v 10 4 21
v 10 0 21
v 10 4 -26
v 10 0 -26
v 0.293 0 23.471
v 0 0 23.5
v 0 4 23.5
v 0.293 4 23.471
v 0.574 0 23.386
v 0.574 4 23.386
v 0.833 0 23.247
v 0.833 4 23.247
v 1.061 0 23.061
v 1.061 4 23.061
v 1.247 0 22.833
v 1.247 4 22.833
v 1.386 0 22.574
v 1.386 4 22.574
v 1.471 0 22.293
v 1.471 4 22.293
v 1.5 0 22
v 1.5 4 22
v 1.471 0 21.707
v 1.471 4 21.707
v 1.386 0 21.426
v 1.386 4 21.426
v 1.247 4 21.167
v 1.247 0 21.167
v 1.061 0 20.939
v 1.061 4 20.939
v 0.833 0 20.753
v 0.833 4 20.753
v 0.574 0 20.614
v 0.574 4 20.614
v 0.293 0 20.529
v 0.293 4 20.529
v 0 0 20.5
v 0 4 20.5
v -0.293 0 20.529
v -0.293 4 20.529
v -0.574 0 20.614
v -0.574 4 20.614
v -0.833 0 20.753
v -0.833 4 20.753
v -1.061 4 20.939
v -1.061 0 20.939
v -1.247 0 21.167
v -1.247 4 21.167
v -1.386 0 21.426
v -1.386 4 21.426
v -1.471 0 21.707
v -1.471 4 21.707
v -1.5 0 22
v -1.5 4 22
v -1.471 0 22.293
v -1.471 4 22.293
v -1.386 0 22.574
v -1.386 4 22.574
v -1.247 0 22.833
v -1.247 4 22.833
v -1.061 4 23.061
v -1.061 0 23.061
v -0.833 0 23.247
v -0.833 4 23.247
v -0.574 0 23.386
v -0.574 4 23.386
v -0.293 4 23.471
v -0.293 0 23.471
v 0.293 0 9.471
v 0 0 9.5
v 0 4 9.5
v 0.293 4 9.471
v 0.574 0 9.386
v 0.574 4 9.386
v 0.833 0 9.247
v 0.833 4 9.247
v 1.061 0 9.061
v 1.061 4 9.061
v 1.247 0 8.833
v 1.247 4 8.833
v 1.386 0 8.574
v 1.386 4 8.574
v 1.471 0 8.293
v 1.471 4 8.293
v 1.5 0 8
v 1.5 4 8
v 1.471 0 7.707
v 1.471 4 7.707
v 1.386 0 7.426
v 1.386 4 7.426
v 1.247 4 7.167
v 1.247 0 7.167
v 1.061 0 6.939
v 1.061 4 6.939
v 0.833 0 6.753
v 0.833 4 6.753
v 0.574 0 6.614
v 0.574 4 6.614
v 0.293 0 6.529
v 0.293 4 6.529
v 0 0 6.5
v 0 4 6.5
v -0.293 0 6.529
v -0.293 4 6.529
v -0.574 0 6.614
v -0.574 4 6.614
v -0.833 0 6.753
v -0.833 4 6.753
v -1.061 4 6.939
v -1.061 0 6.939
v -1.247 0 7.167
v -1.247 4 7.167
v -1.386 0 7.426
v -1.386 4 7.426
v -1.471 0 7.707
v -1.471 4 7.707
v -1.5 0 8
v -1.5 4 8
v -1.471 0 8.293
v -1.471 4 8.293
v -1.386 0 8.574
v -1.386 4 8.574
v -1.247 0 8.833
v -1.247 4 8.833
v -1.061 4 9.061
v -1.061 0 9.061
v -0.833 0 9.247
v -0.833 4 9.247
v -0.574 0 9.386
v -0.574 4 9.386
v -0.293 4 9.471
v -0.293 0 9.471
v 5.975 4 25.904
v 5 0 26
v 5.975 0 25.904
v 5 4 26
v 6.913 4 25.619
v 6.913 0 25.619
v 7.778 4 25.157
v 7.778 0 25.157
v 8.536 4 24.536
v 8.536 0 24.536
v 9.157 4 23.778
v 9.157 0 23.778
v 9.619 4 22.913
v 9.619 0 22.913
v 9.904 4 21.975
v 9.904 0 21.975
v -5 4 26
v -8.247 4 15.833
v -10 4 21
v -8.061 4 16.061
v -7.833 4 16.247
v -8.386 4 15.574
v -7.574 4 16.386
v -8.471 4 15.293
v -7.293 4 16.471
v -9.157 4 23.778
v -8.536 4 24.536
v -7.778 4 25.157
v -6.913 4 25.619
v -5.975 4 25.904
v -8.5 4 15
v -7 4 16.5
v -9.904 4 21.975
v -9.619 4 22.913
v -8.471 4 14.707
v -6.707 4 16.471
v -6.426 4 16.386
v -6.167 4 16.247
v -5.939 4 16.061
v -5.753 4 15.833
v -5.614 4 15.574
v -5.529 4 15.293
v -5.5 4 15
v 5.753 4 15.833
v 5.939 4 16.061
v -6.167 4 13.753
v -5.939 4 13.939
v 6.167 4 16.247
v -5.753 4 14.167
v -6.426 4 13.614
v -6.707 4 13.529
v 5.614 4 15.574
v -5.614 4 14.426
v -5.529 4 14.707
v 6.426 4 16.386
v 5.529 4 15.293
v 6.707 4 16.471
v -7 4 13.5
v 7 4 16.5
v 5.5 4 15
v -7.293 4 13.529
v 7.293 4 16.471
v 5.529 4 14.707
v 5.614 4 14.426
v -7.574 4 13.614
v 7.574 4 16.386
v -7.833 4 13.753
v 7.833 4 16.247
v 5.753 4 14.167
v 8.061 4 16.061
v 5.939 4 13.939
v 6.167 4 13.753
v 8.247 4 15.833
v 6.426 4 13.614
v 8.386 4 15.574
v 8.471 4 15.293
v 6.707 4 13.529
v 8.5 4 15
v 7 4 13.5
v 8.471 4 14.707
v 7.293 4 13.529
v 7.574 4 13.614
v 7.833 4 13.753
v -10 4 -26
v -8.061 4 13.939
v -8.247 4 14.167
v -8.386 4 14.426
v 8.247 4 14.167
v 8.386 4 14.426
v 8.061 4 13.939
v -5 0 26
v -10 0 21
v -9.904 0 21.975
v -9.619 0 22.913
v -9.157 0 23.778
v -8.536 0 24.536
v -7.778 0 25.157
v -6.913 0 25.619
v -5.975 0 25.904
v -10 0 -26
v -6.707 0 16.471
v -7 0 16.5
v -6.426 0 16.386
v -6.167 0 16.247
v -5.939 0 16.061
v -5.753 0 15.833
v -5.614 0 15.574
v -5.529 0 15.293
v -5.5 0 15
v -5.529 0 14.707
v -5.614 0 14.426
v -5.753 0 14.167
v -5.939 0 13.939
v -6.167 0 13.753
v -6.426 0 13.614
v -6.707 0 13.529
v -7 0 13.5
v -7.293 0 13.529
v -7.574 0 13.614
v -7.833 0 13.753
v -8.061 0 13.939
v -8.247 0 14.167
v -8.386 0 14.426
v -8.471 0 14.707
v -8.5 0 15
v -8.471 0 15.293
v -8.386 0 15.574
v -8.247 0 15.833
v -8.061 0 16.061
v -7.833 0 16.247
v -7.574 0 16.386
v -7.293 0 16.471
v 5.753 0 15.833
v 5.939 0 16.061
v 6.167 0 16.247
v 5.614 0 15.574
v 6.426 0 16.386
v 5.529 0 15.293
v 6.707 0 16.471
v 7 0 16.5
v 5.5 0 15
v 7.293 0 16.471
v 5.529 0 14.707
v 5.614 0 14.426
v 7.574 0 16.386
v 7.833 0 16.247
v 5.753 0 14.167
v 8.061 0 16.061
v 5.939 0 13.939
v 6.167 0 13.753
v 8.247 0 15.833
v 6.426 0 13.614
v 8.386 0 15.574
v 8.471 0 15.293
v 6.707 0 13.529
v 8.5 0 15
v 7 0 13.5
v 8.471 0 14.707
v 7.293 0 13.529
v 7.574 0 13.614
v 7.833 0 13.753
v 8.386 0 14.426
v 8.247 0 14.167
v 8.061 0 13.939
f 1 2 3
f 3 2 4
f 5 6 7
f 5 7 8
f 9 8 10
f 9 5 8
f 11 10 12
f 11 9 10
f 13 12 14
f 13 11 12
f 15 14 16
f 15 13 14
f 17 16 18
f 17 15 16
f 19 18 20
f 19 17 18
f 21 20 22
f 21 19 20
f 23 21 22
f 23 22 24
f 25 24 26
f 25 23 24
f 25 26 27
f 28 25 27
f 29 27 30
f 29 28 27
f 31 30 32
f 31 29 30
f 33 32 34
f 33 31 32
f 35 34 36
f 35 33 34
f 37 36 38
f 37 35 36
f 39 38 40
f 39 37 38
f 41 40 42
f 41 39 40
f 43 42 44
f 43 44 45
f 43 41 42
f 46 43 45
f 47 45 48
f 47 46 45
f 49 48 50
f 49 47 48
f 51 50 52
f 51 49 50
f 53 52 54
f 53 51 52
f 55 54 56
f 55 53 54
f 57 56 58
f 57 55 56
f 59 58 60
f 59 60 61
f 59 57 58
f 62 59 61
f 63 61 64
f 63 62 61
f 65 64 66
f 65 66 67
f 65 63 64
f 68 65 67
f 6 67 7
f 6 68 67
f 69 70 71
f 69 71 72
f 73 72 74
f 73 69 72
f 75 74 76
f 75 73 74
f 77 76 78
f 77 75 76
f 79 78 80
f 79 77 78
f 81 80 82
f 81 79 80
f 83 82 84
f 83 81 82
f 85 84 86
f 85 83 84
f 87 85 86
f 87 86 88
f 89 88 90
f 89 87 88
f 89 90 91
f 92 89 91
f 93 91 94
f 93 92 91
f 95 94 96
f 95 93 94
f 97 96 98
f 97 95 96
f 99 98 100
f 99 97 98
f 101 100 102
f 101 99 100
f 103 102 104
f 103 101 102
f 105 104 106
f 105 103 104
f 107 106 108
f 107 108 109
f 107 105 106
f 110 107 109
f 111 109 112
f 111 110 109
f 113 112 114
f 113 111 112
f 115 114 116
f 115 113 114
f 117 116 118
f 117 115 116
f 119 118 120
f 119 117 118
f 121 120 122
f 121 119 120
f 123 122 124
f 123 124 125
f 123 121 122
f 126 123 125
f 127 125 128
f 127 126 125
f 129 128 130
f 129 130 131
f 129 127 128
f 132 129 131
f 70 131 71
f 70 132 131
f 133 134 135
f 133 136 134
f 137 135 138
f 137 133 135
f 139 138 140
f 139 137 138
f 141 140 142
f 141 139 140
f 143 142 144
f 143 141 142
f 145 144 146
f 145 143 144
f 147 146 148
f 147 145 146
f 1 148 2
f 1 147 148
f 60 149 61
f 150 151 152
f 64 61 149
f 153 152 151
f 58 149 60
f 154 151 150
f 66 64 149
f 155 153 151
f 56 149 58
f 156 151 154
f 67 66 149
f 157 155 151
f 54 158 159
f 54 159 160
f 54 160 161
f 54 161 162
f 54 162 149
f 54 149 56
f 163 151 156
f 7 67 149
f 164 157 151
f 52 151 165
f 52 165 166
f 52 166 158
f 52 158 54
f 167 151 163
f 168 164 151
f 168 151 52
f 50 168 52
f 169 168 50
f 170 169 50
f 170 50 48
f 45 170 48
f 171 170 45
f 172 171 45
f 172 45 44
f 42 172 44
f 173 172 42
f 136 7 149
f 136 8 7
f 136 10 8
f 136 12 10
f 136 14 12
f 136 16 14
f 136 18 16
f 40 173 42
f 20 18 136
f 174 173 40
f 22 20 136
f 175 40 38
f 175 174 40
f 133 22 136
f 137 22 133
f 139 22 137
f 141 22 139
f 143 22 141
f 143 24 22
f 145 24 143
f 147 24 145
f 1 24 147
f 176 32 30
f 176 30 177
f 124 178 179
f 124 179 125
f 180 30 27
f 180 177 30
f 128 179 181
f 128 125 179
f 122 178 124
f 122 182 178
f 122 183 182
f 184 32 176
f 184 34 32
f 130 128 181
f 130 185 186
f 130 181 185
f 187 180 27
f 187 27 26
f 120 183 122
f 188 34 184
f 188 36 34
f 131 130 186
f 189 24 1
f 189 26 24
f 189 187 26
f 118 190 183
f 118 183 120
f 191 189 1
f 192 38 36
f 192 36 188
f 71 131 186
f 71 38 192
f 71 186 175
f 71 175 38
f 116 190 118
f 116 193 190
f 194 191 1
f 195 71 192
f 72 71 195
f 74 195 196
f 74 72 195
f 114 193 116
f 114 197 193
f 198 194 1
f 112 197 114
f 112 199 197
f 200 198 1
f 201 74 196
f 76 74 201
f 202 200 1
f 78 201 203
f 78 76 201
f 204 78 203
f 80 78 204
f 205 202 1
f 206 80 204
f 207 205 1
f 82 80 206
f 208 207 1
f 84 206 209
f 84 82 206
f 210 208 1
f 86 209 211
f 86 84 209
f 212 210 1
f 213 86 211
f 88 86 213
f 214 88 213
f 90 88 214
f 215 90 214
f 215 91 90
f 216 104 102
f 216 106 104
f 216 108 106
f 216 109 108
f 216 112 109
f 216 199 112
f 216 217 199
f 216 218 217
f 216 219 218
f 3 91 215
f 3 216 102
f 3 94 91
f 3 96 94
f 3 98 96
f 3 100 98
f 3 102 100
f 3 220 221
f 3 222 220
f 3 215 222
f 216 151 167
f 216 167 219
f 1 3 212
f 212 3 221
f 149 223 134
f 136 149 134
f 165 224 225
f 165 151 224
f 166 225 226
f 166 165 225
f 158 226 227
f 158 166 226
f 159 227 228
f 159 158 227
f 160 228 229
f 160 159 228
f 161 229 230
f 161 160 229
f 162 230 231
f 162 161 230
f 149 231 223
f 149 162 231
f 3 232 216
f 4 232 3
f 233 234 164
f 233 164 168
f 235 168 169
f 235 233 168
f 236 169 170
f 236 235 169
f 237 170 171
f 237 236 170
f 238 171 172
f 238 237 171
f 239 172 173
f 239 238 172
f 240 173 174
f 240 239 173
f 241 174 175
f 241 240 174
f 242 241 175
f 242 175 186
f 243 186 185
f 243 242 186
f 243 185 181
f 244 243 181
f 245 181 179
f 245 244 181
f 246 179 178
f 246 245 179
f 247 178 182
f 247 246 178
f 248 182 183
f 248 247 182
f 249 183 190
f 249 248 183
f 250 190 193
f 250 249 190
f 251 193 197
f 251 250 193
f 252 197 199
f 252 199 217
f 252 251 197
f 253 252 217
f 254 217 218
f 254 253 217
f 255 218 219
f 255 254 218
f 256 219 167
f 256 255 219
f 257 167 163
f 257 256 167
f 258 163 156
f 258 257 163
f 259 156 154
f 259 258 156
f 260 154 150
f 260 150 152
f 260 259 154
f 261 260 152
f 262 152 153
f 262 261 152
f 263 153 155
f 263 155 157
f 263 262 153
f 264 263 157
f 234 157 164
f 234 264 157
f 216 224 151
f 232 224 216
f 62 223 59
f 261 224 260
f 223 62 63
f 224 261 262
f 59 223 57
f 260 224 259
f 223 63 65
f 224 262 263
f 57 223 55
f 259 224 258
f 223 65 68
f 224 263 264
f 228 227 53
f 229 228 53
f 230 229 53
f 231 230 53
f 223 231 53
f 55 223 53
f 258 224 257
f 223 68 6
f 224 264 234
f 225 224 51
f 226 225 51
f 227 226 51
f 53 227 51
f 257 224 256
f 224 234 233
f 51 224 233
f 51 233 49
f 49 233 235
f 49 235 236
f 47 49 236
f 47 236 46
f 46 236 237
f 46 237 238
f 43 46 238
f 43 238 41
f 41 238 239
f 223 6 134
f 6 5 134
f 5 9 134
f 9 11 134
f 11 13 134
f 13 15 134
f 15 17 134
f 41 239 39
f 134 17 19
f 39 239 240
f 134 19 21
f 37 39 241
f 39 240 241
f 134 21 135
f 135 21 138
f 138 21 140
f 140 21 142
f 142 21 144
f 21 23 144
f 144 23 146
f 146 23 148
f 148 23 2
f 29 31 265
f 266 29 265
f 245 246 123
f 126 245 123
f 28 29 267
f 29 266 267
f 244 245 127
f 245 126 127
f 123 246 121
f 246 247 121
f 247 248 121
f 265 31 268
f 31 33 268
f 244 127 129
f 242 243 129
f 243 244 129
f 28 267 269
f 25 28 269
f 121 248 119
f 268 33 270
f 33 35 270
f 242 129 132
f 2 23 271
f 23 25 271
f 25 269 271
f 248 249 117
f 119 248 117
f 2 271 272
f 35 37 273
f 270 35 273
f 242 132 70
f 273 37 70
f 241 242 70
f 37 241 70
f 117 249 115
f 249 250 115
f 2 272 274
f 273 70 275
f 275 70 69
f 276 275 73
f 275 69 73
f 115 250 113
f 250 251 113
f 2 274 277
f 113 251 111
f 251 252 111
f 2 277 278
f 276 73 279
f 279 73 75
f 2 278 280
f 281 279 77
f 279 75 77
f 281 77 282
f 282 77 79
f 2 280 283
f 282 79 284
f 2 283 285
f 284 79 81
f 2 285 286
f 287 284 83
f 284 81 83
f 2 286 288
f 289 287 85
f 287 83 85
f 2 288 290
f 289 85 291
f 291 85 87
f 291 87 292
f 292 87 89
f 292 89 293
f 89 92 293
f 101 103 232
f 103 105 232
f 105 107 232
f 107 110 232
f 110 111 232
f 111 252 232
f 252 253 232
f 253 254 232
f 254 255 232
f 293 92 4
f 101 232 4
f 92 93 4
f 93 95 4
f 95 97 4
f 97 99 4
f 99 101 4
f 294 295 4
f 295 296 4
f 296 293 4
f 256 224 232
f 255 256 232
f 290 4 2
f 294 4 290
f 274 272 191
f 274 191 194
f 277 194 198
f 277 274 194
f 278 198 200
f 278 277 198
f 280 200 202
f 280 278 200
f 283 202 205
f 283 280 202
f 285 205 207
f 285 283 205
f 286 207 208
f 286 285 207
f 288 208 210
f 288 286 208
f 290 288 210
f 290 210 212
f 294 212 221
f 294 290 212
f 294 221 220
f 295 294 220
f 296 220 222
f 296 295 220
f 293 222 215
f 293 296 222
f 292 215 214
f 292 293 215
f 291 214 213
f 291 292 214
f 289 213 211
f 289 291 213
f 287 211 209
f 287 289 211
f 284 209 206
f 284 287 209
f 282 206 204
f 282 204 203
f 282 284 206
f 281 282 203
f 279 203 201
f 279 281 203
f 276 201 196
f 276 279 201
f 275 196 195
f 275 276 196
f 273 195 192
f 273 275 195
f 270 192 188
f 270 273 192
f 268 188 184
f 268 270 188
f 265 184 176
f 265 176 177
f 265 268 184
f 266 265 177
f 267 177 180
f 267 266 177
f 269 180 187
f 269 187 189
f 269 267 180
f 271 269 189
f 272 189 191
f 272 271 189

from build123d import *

# Parameters (mm, degrees)
SKETCH1_W           = 20
SKETCH1_H           = 52
SKETCH1_R           = 1.5
BOSS_EXTRUDE1_DEPTH = 4
FILLET1_R           = 5


with BuildPart() as part:
    # Sketch1 → Boss-Extrude1 (new body)
    with BuildSketch(Plane(origin=(0, 0, 0), x_dir=(1, 0, 0), z_dir=(0, 1, 0))):
        Rectangle(SKETCH1_W, SKETCH1_H)
        with Locations(Location((0, -22, 0), (0, 0, 270))):
            Circle(SKETCH1_R, mode=Mode.SUBTRACT)
        with Locations(Location((0, -8, 0), (0, 0, 270))):
            Circle(SKETCH1_R, mode=Mode.SUBTRACT)
        with Locations(Location((7, -15, 0), (0, 0, 270))):
            Circle(SKETCH1_R, mode=Mode.SUBTRACT)
        with Locations(Location((-7, -15, 0), (0, 0, 270))):
            Circle(SKETCH1_R, mode=Mode.SUBTRACT)
    extrude(amount=BOSS_EXTRUDE1_DEPTH)

    # Fillet1
    fillet1_edges = [part.edges().sort_by_distance(p)[0] for p in [
        (10, 2, 26),
        (-10, 2, 26),
    ]]
    fillet(fillet1_edges, radius=FILLET1_R)


solid = part.part
